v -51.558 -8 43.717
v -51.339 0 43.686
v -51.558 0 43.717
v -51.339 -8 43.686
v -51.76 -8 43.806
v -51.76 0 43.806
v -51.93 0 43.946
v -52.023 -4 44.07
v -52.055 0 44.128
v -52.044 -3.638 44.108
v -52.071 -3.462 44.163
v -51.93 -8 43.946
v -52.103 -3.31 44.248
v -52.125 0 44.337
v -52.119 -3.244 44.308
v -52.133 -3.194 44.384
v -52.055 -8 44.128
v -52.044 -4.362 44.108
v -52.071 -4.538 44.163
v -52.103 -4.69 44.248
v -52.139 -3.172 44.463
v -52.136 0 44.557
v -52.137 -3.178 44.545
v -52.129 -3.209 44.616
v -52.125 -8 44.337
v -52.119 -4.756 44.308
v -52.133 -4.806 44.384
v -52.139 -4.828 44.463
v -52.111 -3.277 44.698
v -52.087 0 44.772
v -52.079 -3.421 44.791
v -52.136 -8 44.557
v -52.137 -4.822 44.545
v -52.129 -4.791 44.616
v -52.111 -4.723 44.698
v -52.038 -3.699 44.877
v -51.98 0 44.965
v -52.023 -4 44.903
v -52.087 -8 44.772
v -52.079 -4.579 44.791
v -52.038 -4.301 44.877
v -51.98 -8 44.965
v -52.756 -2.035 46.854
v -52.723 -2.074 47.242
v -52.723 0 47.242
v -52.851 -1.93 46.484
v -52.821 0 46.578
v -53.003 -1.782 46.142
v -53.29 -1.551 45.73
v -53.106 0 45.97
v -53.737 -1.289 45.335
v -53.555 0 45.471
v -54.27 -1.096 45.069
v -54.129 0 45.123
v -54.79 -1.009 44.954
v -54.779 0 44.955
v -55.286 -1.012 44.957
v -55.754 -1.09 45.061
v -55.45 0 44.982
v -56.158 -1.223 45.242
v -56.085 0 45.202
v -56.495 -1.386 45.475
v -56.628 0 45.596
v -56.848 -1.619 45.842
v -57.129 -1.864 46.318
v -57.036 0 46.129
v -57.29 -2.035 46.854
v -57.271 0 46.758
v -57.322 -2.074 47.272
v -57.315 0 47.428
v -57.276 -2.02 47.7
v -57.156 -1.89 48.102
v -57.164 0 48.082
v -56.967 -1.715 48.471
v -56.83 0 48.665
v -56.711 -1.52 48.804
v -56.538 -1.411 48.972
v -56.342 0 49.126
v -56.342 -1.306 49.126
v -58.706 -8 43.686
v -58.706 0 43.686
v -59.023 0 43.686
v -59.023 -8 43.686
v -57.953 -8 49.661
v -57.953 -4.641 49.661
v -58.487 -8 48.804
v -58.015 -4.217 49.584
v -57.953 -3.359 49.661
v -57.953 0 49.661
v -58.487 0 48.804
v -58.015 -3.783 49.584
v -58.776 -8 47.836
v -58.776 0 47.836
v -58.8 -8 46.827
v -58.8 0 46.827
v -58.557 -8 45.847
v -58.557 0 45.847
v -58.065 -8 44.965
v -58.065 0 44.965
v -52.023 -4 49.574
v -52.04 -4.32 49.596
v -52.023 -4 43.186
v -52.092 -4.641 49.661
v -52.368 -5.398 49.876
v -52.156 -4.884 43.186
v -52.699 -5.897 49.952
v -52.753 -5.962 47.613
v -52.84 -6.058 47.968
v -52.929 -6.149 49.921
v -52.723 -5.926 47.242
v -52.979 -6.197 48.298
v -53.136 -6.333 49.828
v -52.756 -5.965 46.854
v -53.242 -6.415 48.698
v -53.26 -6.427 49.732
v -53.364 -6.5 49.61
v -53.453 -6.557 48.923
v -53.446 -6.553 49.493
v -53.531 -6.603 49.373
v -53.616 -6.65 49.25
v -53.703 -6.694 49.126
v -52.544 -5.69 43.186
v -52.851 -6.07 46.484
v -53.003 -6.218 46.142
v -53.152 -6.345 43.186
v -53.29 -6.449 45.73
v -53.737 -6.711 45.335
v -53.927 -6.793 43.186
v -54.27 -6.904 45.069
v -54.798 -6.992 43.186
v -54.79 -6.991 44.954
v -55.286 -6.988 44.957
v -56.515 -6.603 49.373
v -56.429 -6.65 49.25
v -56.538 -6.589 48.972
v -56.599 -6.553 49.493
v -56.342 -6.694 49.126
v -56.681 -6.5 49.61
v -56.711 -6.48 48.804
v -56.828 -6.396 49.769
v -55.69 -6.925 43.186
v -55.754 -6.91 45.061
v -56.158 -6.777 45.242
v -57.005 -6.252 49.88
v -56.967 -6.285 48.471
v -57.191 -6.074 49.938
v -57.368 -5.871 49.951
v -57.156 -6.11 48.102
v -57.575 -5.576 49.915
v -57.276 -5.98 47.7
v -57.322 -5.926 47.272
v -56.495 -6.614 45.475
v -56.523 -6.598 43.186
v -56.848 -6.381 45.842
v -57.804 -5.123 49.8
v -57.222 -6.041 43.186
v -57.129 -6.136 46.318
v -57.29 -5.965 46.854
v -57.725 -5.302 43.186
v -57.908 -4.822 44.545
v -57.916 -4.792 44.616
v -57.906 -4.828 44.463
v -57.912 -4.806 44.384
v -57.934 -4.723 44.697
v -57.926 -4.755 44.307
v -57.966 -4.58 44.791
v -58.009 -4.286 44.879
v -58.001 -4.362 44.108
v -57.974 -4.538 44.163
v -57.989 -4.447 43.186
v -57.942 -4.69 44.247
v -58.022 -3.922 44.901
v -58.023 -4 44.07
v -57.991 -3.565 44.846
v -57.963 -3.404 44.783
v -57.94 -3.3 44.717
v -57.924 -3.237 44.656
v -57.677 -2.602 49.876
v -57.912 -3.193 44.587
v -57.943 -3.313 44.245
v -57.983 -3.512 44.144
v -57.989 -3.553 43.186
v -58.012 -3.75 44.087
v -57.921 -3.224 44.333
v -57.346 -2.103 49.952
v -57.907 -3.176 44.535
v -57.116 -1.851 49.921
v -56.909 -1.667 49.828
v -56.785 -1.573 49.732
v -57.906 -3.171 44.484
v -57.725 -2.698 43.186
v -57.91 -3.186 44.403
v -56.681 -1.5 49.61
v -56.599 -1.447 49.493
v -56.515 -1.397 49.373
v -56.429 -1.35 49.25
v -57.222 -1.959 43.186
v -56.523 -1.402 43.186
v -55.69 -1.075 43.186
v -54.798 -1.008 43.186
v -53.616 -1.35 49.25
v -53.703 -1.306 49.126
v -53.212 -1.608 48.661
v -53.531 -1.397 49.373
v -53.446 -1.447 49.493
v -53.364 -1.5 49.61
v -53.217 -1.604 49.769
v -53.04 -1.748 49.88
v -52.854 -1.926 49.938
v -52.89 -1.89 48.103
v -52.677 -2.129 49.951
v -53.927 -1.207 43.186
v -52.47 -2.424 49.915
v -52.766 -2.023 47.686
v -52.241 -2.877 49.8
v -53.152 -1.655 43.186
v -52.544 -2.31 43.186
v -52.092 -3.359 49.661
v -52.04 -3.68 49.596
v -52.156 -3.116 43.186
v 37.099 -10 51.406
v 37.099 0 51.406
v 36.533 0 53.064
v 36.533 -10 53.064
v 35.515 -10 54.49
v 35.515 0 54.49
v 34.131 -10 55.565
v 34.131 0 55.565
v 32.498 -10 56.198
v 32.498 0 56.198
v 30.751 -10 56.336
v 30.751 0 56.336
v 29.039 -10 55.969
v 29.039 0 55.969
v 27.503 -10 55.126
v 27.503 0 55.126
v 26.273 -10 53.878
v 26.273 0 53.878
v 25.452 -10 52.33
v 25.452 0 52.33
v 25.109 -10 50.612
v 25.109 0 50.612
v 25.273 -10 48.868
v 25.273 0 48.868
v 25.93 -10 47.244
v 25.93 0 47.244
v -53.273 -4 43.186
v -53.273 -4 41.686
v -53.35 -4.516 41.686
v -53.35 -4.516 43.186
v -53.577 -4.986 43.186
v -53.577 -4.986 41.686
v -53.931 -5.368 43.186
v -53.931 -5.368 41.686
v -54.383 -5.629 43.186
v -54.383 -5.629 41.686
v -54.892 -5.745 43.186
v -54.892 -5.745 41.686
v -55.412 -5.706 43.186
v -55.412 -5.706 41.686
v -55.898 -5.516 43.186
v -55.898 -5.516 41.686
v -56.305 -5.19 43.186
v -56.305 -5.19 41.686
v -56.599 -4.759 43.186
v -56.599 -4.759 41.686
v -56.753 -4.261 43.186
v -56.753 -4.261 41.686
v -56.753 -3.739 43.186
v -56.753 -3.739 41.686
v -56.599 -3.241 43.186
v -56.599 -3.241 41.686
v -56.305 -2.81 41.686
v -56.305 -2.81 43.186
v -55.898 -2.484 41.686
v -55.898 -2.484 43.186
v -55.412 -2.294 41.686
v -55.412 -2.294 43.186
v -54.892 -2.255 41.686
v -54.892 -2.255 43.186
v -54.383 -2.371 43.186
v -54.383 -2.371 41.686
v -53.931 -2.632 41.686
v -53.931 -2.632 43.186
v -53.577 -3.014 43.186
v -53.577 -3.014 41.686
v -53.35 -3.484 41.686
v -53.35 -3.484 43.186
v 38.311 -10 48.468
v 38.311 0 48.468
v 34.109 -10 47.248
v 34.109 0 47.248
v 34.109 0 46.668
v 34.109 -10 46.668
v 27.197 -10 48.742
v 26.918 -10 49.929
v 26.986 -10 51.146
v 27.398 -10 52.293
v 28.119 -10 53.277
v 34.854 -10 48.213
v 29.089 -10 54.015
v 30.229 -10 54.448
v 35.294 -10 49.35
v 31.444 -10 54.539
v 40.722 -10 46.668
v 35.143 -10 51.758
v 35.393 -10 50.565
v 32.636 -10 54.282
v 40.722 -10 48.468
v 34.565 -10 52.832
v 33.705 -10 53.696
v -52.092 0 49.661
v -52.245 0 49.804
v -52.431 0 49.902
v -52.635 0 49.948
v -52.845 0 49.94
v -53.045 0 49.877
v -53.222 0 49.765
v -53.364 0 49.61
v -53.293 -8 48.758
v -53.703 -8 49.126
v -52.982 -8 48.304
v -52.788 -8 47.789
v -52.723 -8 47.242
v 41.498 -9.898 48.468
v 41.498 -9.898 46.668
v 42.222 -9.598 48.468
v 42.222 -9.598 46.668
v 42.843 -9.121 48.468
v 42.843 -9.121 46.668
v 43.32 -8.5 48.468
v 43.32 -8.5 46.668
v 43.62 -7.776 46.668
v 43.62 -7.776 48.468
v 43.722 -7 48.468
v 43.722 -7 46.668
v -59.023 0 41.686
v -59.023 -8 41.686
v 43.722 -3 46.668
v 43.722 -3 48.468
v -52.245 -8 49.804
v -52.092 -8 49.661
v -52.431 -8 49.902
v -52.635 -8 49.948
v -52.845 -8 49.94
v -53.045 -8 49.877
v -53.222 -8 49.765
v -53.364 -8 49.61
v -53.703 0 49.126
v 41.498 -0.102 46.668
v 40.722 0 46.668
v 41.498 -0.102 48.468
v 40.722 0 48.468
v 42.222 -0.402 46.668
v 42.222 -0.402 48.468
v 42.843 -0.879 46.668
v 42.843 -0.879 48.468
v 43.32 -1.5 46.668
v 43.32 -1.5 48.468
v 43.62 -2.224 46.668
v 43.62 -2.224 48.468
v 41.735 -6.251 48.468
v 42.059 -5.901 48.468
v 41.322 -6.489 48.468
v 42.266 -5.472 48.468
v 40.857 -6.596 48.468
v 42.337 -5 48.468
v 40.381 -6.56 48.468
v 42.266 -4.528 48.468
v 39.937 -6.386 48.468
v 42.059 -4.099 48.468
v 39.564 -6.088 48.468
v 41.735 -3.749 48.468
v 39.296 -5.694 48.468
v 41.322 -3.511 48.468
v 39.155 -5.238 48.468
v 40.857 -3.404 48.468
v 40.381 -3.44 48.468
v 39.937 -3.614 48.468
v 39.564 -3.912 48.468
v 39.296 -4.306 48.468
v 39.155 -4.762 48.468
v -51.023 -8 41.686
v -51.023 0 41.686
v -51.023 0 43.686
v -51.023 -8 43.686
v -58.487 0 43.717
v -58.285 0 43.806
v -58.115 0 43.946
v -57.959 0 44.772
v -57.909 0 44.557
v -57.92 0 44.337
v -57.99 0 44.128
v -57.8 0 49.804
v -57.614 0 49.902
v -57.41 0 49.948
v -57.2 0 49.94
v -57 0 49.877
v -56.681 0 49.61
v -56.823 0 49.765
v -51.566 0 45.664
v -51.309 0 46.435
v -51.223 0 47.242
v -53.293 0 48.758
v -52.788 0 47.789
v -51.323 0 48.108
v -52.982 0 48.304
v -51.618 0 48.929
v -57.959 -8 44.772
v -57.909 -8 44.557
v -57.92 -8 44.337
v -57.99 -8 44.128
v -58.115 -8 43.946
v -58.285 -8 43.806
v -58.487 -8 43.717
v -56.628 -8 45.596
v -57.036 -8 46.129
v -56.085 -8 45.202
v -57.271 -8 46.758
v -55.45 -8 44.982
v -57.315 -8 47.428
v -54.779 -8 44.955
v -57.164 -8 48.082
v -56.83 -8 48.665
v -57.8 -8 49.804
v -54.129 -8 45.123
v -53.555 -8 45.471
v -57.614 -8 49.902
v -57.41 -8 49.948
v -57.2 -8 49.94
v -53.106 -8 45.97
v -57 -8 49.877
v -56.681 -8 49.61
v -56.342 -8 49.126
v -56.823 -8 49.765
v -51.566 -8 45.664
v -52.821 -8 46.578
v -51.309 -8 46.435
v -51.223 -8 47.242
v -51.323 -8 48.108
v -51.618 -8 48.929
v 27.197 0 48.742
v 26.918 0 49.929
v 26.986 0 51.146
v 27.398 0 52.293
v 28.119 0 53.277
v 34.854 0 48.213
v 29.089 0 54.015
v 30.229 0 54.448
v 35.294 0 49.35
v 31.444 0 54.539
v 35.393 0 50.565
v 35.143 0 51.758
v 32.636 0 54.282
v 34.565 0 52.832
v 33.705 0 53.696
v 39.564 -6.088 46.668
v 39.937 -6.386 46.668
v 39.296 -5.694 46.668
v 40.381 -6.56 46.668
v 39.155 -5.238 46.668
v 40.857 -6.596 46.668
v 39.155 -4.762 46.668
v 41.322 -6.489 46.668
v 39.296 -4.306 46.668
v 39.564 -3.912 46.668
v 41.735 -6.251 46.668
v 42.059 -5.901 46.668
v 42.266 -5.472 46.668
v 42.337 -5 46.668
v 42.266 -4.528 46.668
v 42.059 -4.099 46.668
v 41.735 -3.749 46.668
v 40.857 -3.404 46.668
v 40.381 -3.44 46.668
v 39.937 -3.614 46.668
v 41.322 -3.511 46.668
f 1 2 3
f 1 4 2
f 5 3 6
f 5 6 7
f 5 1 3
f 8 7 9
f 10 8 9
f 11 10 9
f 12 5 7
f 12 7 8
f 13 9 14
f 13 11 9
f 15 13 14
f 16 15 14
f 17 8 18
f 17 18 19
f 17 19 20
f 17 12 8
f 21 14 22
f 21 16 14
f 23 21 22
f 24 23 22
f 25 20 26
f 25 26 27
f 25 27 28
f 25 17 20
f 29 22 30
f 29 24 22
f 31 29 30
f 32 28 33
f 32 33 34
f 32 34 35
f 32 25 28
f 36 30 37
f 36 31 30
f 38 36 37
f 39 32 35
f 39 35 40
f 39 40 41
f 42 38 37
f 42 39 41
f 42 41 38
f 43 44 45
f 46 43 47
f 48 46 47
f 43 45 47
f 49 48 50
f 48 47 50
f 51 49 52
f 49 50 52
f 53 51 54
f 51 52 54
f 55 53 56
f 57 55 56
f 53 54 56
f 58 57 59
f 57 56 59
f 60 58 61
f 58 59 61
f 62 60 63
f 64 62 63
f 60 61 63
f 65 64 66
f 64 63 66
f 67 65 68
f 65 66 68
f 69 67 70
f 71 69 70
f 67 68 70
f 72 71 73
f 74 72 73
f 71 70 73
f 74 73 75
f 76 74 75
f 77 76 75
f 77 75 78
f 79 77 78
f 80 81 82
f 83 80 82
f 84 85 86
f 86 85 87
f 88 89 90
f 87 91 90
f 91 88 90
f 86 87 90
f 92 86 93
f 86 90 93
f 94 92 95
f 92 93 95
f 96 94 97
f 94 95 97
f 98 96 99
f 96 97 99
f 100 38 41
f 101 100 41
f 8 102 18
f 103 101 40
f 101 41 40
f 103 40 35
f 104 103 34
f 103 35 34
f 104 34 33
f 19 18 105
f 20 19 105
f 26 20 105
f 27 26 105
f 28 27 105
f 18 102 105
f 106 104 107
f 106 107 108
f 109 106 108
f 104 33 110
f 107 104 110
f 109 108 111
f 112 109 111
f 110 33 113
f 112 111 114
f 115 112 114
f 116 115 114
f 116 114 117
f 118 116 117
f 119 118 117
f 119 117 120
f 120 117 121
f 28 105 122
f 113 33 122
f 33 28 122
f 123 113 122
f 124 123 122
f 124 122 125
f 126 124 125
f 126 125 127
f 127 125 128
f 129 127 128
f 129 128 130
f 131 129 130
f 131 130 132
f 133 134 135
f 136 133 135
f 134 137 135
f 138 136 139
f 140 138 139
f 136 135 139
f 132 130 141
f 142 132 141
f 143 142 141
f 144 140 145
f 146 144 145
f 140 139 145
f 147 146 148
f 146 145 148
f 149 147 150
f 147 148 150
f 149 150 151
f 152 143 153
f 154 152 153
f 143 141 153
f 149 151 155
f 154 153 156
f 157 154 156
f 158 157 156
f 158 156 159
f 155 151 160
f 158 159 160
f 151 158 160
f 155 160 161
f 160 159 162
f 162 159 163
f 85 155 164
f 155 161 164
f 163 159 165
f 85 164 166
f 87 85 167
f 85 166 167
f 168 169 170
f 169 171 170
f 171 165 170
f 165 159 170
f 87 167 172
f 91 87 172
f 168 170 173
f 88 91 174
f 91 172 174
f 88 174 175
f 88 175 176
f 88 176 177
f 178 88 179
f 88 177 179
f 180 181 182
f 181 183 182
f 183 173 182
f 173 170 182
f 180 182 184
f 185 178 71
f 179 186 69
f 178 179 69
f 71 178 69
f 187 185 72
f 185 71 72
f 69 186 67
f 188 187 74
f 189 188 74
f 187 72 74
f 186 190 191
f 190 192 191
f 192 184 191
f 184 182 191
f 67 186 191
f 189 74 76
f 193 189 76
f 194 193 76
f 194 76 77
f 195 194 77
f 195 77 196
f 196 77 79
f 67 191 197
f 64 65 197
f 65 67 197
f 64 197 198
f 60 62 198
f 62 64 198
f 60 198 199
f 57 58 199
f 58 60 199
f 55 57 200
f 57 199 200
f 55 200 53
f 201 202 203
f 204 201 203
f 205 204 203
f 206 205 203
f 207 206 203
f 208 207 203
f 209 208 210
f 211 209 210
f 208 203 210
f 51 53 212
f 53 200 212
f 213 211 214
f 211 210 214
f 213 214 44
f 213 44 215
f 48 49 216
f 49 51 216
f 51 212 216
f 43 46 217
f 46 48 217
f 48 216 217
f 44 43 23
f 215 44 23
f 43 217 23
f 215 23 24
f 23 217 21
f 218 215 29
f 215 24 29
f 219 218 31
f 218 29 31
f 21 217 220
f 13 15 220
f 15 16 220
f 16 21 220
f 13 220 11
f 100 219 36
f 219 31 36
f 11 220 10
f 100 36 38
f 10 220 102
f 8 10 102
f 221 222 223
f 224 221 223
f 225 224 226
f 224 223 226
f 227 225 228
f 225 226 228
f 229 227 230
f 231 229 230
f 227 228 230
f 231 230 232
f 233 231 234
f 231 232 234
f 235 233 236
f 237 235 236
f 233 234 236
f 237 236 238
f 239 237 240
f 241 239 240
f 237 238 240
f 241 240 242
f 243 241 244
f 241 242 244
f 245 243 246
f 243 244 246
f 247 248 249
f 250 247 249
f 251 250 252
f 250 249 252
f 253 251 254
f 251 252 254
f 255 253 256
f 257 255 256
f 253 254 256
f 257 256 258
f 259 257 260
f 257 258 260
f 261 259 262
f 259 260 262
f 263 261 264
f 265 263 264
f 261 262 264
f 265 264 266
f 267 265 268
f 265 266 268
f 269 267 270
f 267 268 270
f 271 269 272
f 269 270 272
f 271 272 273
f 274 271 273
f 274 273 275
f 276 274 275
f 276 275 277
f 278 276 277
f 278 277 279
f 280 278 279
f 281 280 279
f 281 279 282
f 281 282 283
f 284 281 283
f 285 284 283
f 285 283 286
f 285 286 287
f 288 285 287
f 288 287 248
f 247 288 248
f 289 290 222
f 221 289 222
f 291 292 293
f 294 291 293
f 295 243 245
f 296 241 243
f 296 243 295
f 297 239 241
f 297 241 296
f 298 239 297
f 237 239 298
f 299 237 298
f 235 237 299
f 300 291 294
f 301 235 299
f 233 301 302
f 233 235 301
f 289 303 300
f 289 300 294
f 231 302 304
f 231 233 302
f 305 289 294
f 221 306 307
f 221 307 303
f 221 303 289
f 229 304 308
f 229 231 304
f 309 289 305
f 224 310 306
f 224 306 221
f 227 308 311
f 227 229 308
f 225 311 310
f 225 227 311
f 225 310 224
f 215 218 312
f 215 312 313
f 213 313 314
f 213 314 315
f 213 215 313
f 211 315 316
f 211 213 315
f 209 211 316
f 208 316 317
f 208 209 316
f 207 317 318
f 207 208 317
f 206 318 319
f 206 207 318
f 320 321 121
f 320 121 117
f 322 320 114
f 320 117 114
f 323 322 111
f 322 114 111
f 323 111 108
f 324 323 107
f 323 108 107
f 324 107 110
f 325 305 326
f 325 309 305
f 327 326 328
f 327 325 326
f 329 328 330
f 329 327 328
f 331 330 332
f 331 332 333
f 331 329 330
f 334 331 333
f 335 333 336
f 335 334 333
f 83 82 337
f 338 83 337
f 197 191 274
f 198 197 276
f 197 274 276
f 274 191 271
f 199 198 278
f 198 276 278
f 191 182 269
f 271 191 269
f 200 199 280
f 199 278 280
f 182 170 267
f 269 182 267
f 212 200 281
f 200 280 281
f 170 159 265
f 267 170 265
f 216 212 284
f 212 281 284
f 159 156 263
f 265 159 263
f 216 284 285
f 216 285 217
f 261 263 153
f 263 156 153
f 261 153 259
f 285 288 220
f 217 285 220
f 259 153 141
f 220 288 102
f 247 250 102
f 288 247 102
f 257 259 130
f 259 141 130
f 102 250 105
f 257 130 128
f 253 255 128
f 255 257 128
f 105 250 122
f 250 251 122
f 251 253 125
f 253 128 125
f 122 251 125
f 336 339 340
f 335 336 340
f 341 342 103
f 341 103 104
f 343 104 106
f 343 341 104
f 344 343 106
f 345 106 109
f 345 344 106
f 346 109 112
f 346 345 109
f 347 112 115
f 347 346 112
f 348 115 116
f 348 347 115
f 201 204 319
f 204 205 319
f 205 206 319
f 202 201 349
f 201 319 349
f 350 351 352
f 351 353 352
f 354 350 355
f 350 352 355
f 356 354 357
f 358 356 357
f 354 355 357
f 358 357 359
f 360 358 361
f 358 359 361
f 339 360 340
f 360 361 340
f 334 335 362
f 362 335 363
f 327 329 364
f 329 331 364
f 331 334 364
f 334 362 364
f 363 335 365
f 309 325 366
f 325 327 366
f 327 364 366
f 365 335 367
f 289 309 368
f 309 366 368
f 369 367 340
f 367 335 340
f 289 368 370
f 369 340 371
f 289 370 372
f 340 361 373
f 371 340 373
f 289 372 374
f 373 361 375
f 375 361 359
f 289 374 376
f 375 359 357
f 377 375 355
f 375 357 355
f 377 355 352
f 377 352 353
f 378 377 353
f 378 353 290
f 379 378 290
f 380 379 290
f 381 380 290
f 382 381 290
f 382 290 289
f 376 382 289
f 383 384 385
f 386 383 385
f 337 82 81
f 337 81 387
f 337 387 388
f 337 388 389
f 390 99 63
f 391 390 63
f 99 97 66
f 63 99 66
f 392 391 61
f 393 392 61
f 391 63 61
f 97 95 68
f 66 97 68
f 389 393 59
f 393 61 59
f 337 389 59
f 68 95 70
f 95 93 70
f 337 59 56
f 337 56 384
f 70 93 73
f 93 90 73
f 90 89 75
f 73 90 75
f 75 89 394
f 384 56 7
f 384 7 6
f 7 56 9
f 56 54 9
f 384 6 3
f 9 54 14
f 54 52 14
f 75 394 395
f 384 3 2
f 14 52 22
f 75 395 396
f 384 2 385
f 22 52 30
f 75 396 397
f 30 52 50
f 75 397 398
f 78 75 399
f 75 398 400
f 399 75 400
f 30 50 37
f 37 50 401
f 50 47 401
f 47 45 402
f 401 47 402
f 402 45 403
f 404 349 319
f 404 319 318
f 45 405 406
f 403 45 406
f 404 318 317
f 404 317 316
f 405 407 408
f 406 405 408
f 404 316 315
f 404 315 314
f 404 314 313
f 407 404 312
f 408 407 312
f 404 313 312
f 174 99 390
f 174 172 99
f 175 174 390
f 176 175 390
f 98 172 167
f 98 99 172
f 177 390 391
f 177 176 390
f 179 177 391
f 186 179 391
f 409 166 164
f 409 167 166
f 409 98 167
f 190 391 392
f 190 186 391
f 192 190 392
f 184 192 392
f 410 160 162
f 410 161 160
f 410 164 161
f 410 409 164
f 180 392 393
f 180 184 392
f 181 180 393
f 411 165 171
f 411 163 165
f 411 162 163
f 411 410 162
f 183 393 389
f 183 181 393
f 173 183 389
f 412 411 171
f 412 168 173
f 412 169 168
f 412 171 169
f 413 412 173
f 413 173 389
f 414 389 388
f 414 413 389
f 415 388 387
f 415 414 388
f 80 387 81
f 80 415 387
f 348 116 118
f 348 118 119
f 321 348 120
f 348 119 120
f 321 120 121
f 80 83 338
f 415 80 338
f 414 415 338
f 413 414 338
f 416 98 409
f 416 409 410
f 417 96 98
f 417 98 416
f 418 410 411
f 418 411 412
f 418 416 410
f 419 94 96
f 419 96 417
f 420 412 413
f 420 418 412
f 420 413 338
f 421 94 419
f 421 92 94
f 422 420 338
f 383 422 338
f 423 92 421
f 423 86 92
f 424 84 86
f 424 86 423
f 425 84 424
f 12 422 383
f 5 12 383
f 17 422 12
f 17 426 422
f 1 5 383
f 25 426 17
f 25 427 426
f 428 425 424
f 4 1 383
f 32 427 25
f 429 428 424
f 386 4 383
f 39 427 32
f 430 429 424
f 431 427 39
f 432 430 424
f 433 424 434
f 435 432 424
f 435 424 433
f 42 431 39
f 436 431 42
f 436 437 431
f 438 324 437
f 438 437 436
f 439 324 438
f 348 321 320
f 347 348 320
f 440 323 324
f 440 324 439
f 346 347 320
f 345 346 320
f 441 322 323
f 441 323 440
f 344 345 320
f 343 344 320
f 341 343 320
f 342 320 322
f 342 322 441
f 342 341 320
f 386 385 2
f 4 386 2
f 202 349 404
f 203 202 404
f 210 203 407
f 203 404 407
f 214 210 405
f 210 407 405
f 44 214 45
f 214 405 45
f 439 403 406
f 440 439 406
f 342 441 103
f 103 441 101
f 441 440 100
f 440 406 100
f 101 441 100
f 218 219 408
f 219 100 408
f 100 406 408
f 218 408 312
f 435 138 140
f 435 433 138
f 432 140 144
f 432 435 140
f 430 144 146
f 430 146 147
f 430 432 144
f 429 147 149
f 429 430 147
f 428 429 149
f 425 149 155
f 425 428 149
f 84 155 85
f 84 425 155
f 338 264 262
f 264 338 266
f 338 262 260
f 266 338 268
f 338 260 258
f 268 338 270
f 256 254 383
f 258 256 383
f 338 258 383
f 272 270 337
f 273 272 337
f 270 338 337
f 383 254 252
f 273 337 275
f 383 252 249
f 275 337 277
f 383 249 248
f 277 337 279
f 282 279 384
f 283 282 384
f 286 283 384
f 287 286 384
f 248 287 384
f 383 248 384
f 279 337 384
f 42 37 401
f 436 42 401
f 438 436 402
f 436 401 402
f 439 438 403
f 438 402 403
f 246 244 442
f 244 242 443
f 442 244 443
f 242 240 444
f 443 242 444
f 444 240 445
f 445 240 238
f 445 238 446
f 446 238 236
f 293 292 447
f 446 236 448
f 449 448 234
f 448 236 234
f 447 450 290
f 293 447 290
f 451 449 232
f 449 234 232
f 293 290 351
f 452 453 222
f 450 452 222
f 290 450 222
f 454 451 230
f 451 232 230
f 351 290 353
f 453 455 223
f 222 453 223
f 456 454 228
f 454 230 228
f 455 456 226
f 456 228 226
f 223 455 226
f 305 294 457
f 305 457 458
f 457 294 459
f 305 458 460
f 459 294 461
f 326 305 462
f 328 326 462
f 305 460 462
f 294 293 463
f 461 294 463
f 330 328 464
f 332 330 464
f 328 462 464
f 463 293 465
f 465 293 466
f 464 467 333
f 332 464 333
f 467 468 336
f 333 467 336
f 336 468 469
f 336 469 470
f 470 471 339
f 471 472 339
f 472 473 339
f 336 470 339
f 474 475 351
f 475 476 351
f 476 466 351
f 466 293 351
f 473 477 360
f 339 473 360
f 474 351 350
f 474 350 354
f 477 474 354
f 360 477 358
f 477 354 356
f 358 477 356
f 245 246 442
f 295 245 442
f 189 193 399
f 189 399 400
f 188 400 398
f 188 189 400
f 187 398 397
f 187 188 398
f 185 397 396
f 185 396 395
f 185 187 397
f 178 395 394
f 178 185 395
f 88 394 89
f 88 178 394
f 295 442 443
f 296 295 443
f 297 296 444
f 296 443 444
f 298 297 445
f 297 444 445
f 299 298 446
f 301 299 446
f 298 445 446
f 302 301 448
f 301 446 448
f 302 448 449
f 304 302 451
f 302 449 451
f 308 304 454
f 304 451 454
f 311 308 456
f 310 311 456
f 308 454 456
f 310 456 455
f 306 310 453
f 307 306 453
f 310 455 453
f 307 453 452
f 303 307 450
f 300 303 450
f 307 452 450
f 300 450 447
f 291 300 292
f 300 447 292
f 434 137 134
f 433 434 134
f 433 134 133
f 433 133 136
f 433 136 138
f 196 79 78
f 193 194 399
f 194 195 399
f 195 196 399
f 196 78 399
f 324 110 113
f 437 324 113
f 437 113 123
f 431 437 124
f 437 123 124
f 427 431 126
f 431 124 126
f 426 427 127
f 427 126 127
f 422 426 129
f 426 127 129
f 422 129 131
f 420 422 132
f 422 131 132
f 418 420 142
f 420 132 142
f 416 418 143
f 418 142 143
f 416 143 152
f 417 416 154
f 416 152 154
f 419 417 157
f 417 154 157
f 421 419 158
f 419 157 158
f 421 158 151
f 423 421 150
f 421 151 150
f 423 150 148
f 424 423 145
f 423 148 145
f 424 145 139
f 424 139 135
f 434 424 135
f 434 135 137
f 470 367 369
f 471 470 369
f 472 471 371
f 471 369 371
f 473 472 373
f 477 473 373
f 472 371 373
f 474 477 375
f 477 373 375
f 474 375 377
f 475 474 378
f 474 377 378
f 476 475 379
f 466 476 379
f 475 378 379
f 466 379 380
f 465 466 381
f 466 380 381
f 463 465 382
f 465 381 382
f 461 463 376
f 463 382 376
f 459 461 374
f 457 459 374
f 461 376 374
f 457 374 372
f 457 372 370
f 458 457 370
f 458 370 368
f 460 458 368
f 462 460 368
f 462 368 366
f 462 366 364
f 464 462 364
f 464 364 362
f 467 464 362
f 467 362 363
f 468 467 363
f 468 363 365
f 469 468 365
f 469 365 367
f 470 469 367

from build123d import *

# Parameters (mm, degrees)
F1_DEPTH = 8
F2_R     = 0.8
F3_R     = 1.75
F4_DEPTH = 8.266459521
F5_START = -1.5
F3_R_2   = 3
F5_DEPTH = 13.5
F7_DEPTH = 10
F8_R     = 1.6
F9_DEPTH = 6.7828354428
F10_R    = 3


with BuildPart() as f1:
    # F0 (on Front) → F1 (new body)
    with BuildSketch(Plane.XZ):
        with BuildLine():
            ThreePointArc((-53.7033075237, 49.1260529639), (-52.982408411, 48.3040250725), (-52.7225333273, 47.242003262))
            ThreePointArc((-52.7225333273, 47.242003262), (-56.0845551378, 45.2018783457), (-56.3417591309, 49.1260529639))
            Line((-56.3417591309, 49.1260529639), (-57.2021237855, 50.3547810303))
            ThreePointArc((-57.2021237855, 50.3547810303), (-58.7927777428, 46.7673907382), (-56.3626516399, 43.6861513376))
            Line((-56.3626516399, 43.6861513376), (-53.6824150148, 43.6861513376))
            ThreePointArc((-53.6824150148, 43.6861513376), (-51.8974373618, 45.0801116815), (-51.2225333273, 47.242003262))
            ThreePointArc((-51.2225333273, 47.242003262), (-51.6518921613, 48.9966479923), (-52.8429428692, 50.3547810303))
            Line((-52.8429428692, 50.3547810303), (-53.7033075237, 49.1260529639))
        make_face()
        with BuildLine():
            ThreePointArc((-53.6824150148, 43.6861513376), (-55.0225333273, 43.442003262), (-56.3626516399, 43.6861513376))
            Line((-56.3626516399, 43.6861513376), (-59.0225333273, 43.6861513376))
            Line((-59.0225333273, 43.6861513376), (-59.0225333273, 41.6861513376))
            Line((-59.0225333273, 41.6861513376), (-51.0225333273, 41.6861513376))
            Line((-51.0225333273, 41.6861513376), (-51.0225333273, 43.6861513376))
            Line((-51.0225333273, 43.6861513376), (-53.6824150148, 43.6861513376))
        make_face()
        with BuildLine():
            Line((-53.6824150148, 43.6861513376), (-56.3626516399, 43.6861513376))
            ThreePointArc((-56.3626516399, 43.6861513376), (-55.0225333273, 43.442003262), (-53.6824150148, 43.6861513376))
        make_face()
    extrude(amount=F1_DEPTH)

    # F2
    f2_edges = [f1.edges().sort_by_distance(p)[0] for p in [
        (-56.362652, -4, 43.686151),
        (-53.682415, -4, 43.686151),
        (-57.202124, -4, 50.354781),
        (-52.842943, -4, 50.354781),
    ]]
    fillet(f2_edges, radius=F2_R)

    # F3 (on face) → F4 (cut, through all)
    with BuildSketch(Plane(origin=(0, 0, 41.6861513376), x_dir=(1, 0, 0), z_dir=(0, 0, -1))):
        with Locations((-55.0225333273, 4)):
            Circle(F3_R)
    extrude(amount=-F4_DEPTH, mode=Mode.SUBTRACT)

    # F3 (on face) → F5 (cut)
    with BuildSketch(Plane(origin=(0, 0, 41.6861513376), x_dir=(1, 0, 0), z_dir=(0, 0, -1)).offset(F5_START)):
        with Locations((-55.0225333273, 4)):
            Circle(F3_R_2)
        with Locations((-55.0225333273, 4)):
            Circle(F3_R, mode=Mode.SUBTRACT)
    extrude(amount=-F5_DEPTH, mode=Mode.SUBTRACT)


with BuildPart() as f7:
    # F6 (on Front) → F7 (new body)
    with BuildSketch(Plane.XZ):
        with BuildLine():
            ThreePointArc((27.1970029577, 48.7419112075), (32.0493710779, 54.4534840109), (34.1091194362, 47.2475852492))
            Line((34.1091194362, 47.2475852492), (34.1091194362, 46.6679867804))
            Line((34.1091194362, 46.6679867804), (35.6683470309, 46.6679867804))
            Line((35.6683470309, 46.6679867804), (37.9846775437, 46.6679867804))
            Line((37.9846775437, 46.6679867804), (43.7218266428, 46.6679867804))
            Line((43.7218266428, 46.6679867804), (43.7218266428, 48.4679867804))
            Line((43.7218266428, 48.4679867804), (38.3111834526, 48.4679867804))
            Line((38.3111834526, 48.4679867804), (37.0992450122, 51.4060711779))
            ThreePointArc((37.0992450122, 51.4060711779), (29.0385841912, 55.9685666973), (25.9298348349, 47.2435282633))
            Line((25.9298348349, 47.2435282633), (27.1970029577, 48.7419112075))
        make_face()
    extrude(amount=F7_DEPTH)

    # F8 (on face) → F9 (cut, through all)
    with BuildSketch(Plane.XY.offset(48.4679867804)):
        with Locations((40.7373113036, -5)):
            Circle(F8_R)
    extrude(amount=-F9_DEPTH, mode=Mode.SUBTRACT)

    # F10
    f10_edges = [f7.edges().sort_by_distance(p)[0] for p in [
        (43.721827, -10, 47.567987),
        (43.721827, 0, 47.567987),
    ]]
    fillet(f10_edges, radius=F10_R)


solid = Compound([f1.part, f7.part])
